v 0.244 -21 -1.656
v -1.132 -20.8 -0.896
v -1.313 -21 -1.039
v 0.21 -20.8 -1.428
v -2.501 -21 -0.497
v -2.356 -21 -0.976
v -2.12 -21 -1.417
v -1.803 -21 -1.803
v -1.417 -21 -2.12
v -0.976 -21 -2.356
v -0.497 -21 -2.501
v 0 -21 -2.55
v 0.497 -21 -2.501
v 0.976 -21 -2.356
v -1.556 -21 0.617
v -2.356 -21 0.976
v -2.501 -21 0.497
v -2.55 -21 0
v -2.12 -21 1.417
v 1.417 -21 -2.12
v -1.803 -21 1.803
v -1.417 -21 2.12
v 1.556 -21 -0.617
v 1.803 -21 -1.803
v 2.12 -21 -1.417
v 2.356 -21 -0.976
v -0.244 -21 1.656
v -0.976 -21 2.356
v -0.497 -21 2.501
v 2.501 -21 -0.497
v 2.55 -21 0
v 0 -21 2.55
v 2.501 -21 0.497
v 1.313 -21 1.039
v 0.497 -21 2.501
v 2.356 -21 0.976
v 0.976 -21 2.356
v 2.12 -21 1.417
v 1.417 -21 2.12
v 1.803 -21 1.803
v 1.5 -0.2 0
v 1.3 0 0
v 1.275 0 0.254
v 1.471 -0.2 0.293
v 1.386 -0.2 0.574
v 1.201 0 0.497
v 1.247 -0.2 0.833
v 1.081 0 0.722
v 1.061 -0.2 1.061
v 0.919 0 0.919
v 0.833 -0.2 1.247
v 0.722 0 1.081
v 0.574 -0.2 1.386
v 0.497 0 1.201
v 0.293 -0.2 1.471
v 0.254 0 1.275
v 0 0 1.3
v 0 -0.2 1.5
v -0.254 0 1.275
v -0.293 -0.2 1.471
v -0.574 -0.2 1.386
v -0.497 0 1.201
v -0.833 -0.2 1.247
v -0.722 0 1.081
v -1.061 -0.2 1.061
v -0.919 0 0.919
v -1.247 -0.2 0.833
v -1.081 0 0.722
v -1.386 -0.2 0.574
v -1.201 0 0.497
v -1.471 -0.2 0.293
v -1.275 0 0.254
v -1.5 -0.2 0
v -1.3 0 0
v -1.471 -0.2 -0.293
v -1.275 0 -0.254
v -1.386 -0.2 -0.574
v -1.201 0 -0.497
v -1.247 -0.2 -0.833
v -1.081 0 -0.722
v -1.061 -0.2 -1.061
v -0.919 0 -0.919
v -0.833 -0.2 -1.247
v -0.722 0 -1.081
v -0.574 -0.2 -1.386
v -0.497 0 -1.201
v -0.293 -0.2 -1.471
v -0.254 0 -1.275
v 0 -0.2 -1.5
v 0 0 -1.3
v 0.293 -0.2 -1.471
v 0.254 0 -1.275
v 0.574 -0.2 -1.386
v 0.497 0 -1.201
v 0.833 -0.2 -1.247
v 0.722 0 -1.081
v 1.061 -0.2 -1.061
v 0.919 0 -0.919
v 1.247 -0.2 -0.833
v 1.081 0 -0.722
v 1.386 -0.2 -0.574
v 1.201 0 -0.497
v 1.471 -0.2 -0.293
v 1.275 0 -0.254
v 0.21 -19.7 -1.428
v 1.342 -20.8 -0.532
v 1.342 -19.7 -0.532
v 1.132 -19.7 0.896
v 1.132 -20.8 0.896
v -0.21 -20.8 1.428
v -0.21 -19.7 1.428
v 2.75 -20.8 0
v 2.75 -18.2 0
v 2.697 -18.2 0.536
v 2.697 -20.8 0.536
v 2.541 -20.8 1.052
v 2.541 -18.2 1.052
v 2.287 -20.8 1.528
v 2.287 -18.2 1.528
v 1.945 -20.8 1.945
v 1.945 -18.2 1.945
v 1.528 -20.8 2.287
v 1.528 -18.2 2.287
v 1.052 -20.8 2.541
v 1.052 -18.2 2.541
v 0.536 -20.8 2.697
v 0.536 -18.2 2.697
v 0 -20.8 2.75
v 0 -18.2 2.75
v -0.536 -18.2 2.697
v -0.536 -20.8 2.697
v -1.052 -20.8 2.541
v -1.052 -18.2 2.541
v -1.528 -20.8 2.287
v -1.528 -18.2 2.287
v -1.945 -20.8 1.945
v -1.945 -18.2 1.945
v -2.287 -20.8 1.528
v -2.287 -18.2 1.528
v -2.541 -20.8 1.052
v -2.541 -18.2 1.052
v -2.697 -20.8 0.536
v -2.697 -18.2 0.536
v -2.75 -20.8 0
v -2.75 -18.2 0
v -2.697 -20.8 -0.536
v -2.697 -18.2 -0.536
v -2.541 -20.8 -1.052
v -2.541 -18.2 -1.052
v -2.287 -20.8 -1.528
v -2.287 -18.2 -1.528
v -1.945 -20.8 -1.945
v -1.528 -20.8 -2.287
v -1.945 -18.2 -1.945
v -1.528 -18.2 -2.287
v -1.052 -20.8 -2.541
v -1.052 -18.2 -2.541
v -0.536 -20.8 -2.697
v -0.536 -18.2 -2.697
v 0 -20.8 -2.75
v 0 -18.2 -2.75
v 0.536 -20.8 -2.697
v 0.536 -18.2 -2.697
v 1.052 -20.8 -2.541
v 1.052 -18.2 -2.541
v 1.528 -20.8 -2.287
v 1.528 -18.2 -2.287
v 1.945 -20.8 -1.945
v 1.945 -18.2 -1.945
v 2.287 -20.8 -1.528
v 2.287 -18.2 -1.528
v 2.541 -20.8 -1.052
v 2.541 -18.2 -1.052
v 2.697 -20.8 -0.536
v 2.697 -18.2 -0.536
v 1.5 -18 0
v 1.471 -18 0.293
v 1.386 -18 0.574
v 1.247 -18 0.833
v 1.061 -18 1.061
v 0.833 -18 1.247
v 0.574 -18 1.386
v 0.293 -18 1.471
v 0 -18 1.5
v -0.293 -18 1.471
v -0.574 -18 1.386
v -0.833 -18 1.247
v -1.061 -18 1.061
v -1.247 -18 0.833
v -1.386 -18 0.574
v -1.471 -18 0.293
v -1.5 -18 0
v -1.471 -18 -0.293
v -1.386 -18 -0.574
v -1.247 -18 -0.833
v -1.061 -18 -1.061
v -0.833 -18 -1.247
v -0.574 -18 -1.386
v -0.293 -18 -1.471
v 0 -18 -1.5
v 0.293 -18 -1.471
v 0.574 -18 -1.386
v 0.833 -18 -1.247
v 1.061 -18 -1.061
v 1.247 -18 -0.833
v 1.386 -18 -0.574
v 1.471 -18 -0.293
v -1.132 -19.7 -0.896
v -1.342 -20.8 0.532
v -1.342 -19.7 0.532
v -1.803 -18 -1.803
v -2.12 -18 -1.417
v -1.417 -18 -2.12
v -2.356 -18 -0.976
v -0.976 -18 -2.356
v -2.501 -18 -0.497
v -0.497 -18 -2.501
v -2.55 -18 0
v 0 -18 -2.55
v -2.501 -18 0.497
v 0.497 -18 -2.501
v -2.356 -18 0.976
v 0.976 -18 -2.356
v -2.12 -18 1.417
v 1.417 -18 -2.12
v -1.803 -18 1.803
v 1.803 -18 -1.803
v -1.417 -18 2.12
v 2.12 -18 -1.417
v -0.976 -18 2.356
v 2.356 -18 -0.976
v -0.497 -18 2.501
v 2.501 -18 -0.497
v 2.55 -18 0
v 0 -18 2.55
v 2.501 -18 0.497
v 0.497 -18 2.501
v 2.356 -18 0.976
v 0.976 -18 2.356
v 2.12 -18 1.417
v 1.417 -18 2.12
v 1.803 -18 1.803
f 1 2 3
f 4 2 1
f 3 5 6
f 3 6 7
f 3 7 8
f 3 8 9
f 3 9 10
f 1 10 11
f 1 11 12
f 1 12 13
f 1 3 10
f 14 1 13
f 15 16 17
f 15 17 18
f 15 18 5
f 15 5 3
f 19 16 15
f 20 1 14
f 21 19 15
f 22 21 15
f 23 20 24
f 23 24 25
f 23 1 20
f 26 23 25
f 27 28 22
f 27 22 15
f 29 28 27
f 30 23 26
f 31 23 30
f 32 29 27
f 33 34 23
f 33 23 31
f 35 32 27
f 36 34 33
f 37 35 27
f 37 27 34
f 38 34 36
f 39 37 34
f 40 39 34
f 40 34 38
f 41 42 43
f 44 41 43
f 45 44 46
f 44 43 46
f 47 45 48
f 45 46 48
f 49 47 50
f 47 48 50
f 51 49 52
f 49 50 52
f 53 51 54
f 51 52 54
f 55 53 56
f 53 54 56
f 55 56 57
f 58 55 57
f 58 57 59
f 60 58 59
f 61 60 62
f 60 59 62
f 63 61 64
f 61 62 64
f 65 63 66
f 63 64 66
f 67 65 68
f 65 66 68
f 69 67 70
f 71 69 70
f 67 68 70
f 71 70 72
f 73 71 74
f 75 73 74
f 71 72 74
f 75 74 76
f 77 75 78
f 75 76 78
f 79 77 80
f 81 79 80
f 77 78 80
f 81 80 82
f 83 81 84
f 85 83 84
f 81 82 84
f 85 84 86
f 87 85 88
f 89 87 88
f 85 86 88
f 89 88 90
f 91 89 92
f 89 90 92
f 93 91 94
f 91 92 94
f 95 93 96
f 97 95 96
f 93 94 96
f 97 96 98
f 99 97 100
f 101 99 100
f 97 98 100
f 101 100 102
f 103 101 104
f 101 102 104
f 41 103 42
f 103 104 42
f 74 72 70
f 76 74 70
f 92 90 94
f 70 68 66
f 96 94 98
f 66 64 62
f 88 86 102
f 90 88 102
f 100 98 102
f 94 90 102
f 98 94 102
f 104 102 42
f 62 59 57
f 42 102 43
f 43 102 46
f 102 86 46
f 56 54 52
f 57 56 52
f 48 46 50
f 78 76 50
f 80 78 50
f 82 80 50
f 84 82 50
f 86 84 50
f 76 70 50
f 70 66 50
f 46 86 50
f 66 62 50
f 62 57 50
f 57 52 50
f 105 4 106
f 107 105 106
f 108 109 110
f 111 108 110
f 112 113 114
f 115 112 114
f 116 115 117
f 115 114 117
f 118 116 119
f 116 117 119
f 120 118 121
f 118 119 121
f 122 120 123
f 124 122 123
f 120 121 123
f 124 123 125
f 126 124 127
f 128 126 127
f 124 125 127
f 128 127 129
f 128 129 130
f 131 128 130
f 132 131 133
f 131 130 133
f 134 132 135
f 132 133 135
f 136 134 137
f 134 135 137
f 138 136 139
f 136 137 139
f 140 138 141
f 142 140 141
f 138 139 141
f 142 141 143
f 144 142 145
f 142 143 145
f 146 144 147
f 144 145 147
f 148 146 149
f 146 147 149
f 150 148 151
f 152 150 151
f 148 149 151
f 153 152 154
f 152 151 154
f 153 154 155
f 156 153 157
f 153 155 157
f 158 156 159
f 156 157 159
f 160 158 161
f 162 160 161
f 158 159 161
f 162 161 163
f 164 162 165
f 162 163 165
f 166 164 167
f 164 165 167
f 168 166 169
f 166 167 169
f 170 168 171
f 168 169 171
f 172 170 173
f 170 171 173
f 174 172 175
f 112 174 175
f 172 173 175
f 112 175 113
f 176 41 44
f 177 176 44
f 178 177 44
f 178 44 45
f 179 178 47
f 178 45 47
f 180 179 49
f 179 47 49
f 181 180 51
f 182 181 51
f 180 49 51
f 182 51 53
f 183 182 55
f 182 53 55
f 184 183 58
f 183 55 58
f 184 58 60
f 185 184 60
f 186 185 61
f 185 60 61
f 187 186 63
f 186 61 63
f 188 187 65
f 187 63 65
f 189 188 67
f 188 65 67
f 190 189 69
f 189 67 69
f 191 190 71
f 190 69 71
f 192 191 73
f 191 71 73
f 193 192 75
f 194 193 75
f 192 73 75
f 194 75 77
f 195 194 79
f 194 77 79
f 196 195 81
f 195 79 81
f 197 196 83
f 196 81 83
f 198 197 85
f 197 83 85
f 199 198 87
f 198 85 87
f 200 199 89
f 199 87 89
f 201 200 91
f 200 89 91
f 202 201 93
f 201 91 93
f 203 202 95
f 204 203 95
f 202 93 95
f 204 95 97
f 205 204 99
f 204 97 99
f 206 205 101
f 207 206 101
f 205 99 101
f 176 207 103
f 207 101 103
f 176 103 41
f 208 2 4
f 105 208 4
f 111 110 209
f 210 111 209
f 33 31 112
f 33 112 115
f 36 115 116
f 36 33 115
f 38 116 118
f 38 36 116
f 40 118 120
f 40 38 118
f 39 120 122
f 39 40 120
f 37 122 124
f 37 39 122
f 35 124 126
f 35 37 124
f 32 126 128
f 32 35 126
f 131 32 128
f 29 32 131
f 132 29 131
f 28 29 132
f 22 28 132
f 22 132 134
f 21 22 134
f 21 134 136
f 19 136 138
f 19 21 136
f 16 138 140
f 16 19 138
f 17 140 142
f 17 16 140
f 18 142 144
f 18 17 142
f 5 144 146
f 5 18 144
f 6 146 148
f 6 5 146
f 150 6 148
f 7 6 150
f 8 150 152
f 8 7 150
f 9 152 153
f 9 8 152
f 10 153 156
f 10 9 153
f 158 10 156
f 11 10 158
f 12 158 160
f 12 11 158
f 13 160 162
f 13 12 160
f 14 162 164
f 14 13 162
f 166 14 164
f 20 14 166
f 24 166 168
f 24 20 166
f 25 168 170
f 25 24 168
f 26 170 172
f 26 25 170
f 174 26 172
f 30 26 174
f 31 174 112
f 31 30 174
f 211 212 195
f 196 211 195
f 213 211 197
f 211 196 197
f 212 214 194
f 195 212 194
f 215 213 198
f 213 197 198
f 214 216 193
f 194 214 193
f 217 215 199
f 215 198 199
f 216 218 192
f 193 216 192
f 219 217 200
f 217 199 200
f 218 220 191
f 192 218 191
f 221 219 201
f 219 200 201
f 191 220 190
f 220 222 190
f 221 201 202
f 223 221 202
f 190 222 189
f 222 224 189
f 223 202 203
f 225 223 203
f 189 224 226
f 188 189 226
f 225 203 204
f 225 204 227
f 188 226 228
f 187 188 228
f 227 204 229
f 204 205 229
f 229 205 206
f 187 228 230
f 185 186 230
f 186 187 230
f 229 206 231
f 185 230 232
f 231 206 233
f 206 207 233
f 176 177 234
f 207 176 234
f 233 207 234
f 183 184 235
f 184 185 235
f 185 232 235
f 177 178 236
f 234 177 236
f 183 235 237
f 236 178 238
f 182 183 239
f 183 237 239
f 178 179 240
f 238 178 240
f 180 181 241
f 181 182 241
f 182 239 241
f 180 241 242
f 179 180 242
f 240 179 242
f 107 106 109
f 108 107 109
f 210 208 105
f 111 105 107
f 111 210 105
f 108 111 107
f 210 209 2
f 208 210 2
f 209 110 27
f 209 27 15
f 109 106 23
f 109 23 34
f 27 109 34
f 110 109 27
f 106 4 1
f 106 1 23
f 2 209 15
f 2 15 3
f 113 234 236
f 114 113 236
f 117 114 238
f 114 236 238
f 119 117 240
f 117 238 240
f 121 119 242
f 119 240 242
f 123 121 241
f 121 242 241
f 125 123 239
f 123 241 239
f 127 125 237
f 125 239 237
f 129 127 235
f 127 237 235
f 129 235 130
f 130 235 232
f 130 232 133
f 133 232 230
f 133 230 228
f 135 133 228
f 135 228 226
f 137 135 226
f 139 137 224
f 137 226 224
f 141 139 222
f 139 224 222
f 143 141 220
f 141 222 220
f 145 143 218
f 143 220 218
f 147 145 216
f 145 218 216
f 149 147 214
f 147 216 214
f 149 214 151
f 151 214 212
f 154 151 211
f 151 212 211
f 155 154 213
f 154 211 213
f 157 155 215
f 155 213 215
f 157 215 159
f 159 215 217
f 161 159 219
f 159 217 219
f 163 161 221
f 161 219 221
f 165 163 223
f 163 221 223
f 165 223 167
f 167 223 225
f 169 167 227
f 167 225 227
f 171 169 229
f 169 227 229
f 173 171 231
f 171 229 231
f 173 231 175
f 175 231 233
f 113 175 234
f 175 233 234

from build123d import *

# Parameters (mm, degrees)
F0_R     = 1.5
F1_DEPTH = 18
F2_R     = 2.75
F3_DEPTH = 3
F5_DEPTH = 1.3
F6_SIZE  = 0.2


with BuildPart() as f1:
    # F0 (on Front) → F1 (new body)
    with BuildSketch(Plane.XZ):
        Circle(F0_R)
    extrude(amount=F1_DEPTH)

    # F2 (on face) → F3 (join)
    with BuildSketch(Plane.XZ.offset(18)):
        Circle(F2_R)
    extrude(amount=F3_DEPTH)

    # F4 (on face) → F5 (cut)
    with BuildSketch(Plane.XZ.offset(21)):
        Polygon((0.2100819211, -1.428005224), (1.3417297613, -0.5320663314), (1.1316478402, 0.8959388926), (-0.2100819211, 1.428005224), (-1.3417297613, 0.5320663314), (-1.1316478402, -0.8959388926), align=None)
    extrude(amount=-F5_DEPTH, mode=Mode.SUBTRACT)

    # F6
    f6_edges = [f1.edges().sort_by_distance(p)[0] for p in [
        (-2.75, -21, 0),
        (-2.75, -18, 0),
        (-1.5, 0, 0),
        (-1.236689, -21, -0.181936),
        (-0.460783, -21, -1.161972),
        (0.775906, -21, -0.980036),
        (1.236689, -21, 0.181936),
        (0.460783, -21, 1.161972),
        (-0.775906, -21, 0.980036),
    ]]
    chamfer(f6_edges, length=F6_SIZE)


solid = f1.part
